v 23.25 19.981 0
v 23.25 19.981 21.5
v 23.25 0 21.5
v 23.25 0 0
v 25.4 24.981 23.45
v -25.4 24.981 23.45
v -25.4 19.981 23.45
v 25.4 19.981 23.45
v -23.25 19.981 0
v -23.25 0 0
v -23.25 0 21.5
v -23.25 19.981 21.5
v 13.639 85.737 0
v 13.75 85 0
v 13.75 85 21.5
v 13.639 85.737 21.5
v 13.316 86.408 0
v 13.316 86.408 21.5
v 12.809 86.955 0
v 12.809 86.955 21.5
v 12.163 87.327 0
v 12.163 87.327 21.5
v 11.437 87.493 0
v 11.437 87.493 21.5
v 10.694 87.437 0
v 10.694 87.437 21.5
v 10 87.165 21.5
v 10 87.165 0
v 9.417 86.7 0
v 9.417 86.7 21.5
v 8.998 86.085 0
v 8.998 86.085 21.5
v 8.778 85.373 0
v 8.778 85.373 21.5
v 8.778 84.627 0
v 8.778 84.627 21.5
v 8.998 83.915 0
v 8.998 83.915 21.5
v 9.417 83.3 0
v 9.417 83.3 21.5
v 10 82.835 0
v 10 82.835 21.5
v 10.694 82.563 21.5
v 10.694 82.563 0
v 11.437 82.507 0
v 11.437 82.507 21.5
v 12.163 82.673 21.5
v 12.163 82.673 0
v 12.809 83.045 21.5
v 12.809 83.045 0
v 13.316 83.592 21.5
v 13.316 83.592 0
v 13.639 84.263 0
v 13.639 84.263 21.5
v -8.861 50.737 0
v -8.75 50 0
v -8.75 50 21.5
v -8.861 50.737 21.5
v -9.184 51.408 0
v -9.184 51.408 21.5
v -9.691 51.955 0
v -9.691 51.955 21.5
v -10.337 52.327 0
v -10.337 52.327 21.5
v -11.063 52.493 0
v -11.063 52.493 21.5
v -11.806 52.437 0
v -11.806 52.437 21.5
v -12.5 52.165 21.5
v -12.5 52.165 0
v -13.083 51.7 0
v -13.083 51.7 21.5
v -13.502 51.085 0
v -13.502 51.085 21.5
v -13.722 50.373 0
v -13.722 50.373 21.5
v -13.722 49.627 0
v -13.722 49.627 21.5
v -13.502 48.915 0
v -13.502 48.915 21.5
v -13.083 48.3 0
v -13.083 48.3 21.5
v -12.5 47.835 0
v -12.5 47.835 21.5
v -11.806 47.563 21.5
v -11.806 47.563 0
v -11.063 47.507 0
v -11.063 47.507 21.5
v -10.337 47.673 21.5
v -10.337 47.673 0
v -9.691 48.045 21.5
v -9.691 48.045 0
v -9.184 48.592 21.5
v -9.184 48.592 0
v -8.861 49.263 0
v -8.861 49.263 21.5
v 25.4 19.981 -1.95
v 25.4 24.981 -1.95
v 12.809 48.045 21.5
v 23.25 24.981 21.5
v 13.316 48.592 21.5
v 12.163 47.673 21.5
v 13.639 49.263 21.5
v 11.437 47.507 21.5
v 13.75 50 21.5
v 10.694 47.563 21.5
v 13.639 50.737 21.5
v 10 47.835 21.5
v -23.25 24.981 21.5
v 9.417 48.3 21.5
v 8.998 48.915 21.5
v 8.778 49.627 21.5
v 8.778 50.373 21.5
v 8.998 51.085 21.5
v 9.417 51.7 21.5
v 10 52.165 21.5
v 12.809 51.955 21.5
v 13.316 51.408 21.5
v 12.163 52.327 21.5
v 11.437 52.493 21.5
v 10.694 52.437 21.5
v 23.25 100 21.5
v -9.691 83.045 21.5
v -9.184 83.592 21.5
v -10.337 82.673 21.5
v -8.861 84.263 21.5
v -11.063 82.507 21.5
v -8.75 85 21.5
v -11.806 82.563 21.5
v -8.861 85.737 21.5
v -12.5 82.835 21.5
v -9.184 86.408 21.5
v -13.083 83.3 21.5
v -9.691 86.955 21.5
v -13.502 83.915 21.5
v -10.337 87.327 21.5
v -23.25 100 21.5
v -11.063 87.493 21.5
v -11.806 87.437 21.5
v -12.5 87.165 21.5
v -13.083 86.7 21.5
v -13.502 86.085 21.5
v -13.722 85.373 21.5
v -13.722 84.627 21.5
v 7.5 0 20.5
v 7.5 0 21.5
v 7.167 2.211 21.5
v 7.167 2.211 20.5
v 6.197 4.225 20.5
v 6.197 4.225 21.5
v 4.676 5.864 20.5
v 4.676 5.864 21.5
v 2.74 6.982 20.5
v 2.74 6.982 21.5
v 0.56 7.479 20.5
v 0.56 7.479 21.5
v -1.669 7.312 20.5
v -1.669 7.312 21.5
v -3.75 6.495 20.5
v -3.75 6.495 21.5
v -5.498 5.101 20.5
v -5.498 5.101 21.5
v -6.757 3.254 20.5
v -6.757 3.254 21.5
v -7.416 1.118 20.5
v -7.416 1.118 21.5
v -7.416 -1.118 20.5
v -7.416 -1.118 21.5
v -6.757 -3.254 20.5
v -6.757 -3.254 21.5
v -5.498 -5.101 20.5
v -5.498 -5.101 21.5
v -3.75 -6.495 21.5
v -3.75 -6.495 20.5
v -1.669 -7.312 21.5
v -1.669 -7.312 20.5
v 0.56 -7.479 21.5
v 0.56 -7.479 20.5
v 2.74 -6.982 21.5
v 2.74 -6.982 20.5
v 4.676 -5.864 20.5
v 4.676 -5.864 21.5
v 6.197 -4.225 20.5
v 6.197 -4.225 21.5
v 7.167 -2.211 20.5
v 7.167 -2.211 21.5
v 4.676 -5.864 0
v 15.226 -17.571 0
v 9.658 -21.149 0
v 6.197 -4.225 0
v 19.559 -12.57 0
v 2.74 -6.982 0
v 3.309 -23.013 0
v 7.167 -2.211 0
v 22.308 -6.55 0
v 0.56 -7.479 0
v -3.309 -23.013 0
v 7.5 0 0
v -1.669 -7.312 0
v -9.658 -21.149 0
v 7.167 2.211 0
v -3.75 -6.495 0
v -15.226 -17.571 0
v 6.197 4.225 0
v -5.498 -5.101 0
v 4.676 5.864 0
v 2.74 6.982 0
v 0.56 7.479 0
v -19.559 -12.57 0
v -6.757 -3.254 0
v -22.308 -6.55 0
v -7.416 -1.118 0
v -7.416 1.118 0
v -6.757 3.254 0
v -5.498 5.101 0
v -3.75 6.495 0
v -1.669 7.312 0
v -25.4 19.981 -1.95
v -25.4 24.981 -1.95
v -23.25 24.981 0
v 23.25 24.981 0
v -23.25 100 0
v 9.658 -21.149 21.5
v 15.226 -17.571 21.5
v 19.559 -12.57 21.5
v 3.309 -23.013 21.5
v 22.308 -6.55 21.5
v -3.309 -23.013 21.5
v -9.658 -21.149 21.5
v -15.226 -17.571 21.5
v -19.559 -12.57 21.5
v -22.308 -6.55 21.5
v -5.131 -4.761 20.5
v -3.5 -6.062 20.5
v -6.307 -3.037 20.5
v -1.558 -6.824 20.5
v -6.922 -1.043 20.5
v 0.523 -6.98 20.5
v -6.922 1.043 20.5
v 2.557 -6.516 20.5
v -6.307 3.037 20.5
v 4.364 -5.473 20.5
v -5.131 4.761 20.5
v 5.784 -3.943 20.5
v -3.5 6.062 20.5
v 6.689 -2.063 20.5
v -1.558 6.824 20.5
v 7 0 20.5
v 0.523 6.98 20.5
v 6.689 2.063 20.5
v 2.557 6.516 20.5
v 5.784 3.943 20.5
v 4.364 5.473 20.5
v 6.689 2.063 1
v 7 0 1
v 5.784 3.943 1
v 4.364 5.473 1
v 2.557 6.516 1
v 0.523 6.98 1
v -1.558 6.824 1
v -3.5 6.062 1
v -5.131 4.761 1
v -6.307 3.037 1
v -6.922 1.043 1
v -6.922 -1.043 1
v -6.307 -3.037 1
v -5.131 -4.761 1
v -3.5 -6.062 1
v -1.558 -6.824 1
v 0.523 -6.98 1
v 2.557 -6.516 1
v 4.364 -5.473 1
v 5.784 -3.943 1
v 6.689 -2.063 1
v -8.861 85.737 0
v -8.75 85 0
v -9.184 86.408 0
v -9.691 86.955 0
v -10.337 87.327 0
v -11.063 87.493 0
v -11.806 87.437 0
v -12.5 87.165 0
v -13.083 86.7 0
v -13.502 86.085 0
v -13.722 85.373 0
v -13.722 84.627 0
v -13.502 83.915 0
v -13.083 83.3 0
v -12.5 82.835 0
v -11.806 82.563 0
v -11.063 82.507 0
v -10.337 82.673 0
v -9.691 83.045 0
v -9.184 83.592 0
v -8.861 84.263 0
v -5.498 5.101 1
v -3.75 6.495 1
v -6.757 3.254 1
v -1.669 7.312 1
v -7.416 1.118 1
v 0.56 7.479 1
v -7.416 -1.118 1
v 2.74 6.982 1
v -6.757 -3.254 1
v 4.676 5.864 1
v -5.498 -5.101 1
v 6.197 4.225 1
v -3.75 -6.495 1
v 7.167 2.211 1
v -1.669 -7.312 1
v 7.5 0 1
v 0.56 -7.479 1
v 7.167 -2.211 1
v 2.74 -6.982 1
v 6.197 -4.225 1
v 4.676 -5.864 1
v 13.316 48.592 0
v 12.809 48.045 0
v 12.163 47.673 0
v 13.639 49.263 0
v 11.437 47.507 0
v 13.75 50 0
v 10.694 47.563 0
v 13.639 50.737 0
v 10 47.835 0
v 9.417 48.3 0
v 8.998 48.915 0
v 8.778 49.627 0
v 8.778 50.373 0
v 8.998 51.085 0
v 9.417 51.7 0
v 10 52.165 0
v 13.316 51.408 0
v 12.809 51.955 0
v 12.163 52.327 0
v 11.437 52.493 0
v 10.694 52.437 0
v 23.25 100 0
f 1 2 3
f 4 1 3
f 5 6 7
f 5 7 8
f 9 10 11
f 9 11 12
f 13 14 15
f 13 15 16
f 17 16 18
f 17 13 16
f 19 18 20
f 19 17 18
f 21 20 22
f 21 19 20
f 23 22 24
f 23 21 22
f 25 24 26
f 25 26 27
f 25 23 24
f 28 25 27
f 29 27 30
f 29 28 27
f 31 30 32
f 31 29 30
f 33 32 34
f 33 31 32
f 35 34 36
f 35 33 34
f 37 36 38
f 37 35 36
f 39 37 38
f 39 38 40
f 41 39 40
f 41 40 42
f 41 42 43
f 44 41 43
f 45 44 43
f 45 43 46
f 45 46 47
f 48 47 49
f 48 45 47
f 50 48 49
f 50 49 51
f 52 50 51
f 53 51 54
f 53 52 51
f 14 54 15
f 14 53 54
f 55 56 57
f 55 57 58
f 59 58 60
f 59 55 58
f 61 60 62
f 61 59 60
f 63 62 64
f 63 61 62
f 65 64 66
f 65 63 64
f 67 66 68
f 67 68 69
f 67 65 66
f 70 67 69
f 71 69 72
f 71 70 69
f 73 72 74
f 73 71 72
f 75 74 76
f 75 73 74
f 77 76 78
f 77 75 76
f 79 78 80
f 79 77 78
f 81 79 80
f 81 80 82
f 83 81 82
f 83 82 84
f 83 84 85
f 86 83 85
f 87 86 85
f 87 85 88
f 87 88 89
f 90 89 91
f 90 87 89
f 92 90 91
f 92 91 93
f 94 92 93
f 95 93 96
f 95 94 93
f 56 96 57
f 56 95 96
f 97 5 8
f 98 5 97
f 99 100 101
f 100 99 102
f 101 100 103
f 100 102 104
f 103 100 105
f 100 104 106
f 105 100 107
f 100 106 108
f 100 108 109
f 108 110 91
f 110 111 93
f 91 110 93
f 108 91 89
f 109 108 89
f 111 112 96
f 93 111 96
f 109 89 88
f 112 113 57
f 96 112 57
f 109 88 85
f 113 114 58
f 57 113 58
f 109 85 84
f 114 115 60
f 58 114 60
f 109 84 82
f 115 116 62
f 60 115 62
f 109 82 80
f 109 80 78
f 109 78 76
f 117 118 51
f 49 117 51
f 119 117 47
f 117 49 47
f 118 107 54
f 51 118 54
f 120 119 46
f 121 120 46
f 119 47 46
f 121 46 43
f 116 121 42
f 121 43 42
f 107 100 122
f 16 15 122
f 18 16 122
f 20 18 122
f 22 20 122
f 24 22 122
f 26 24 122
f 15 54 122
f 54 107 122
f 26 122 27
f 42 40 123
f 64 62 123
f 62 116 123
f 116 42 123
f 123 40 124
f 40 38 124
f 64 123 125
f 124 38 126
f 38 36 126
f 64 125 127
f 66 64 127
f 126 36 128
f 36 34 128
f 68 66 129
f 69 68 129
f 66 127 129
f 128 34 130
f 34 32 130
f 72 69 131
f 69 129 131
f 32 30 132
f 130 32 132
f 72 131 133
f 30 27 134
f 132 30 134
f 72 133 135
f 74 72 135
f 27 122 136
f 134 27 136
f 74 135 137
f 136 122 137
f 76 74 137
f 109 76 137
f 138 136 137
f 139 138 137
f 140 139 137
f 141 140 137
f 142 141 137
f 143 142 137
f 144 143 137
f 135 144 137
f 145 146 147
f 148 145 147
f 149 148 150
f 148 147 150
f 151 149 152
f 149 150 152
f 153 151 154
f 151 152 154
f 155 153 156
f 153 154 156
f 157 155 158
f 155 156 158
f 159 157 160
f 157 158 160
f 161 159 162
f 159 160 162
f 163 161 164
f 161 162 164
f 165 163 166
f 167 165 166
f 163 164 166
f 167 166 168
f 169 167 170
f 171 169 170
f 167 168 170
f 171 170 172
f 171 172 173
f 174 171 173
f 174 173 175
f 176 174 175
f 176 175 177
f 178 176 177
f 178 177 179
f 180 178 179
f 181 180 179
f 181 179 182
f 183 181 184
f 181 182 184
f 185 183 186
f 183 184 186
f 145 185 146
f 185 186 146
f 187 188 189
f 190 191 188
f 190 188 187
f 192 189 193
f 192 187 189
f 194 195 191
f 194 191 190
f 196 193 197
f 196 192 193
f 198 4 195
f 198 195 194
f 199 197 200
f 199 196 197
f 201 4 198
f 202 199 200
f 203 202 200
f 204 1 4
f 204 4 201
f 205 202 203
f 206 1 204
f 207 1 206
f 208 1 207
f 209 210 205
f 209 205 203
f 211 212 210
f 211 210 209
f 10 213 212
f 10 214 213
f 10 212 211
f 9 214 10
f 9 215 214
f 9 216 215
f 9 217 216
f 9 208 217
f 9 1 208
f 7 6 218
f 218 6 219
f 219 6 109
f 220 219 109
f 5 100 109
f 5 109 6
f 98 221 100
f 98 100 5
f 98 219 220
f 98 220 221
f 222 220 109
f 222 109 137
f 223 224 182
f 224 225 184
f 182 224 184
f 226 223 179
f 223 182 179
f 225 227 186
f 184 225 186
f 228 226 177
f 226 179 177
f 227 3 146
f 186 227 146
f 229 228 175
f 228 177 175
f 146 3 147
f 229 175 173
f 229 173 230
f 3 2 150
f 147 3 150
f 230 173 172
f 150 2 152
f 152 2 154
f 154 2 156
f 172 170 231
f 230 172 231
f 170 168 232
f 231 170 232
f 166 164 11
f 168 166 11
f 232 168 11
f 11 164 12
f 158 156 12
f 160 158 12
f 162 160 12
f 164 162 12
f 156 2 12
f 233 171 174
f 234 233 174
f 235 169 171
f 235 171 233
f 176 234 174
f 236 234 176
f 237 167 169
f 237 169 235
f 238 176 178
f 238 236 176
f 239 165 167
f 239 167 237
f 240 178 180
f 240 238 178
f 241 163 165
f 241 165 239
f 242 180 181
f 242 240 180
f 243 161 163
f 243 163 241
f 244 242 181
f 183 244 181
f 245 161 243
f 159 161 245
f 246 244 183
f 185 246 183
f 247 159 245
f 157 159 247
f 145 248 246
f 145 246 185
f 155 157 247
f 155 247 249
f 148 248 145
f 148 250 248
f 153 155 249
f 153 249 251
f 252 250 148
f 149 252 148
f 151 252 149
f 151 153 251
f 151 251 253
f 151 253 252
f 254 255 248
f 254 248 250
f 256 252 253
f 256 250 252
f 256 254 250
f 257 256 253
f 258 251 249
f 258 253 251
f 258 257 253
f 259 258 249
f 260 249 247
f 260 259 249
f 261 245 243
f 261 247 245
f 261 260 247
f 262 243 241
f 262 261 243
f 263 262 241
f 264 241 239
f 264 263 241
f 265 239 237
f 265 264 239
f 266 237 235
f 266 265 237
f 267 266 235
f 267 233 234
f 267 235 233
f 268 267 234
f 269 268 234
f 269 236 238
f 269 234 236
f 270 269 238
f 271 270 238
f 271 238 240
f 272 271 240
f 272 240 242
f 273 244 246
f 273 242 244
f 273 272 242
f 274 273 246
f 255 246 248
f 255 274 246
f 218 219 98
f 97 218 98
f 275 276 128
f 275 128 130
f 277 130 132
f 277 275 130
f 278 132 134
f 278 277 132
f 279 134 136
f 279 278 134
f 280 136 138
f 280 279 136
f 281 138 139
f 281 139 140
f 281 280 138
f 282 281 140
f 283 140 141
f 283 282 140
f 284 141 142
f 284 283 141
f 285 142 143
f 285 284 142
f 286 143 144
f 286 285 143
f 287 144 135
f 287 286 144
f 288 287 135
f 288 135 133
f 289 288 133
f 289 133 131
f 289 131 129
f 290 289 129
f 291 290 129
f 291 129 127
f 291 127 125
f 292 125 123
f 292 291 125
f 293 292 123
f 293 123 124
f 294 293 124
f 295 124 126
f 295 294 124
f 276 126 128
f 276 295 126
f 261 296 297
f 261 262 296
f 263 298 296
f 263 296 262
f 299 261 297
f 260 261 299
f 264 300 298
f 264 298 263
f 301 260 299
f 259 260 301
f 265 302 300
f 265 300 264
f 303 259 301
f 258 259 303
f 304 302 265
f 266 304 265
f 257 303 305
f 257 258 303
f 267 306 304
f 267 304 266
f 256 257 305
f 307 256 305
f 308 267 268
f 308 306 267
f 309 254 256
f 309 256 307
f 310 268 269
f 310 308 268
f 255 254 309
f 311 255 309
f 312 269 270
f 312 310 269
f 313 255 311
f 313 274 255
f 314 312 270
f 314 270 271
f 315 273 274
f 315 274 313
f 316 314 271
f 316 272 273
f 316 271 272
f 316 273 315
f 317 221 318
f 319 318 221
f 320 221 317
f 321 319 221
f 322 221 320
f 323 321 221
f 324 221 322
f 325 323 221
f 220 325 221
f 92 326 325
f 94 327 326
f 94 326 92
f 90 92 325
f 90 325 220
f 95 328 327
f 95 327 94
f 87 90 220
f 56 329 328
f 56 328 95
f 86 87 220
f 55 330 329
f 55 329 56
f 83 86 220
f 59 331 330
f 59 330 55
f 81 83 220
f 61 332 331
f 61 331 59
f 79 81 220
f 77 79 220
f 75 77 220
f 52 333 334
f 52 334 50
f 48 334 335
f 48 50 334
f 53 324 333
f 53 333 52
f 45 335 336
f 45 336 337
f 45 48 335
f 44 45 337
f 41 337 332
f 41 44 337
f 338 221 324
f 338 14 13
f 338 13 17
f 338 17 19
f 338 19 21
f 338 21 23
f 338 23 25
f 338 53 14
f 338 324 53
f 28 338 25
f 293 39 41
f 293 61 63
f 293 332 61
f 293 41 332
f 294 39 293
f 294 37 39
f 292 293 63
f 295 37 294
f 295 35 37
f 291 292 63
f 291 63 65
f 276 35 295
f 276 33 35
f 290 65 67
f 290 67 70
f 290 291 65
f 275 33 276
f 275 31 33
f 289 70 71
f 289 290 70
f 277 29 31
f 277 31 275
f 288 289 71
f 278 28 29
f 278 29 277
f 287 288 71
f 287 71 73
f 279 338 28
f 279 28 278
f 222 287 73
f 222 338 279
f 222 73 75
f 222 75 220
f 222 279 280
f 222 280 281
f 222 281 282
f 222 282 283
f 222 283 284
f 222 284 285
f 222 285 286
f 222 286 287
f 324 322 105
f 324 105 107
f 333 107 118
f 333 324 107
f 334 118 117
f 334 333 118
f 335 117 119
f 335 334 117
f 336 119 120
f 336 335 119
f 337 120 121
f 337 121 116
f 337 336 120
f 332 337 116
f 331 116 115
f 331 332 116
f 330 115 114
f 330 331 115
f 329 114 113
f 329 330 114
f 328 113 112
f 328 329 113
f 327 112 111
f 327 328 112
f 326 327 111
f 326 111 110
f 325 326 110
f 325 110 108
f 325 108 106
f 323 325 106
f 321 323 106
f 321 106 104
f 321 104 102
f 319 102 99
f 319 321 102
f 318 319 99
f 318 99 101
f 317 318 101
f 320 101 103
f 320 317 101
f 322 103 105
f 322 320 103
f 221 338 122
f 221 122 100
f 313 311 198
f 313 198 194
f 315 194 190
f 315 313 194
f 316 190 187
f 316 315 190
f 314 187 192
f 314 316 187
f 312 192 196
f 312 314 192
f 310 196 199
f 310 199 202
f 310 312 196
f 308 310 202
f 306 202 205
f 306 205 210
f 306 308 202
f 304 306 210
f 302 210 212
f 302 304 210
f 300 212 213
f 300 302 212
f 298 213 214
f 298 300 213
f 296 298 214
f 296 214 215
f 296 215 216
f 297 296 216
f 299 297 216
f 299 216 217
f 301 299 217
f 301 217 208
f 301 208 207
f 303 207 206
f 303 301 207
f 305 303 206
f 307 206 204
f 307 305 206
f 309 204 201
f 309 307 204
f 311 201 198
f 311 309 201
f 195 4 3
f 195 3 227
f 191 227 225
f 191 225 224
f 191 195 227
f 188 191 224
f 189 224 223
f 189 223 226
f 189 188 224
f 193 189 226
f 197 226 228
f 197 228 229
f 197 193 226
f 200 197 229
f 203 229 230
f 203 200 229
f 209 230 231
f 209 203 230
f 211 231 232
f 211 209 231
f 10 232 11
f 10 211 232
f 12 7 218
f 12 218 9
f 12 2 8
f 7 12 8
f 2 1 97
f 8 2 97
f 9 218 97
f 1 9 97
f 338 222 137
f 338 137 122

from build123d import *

# Parameters (mm, degrees)
SKETCH1_R           = 7
SKETCH1_R_2         = 2.5
BOSS_EXTRUDE1_DEPTH = 21.5
SKETCH2_R           = 7.5
CUT_EXTRUDE1_DEPTH  = 1
CUT_EXTRUDE2_START  = -1
SKETCH3_R           = 7.5
CUT_EXTRUDE2_DEPTH  = 1
SKETCH5_W           = 50.8
SKETCH5_H           = 25.4
SKETCH5_W_2         = 46.5
SKETCH5_H_2         = 21.5
BOSS_EXTRUDE2_DEPTH = 5


with BuildPart() as part:
    # Sketch1 → Boss-Extrude1 (new body)
    with BuildSketch(Plane.XY):
        with BuildLine():
            Line((-23.25, 0), (-23.25, 100))
            Line((-23.25, 100), (23.25, 100))
            Line((23.25, 100), (23.25, 0))
            ThreePointArc((23.25, 0), (0, -23.25), (-23.25, 0))
        make_face()
        Circle(SKETCH1_R, mode=Mode.SUBTRACT)
        with Locations((-11.25, 85)):
            Circle(SKETCH1_R_2, mode=Mode.SUBTRACT)
        with Locations((11.25, 85)):
            Circle(SKETCH1_R_2, mode=Mode.SUBTRACT)
        with Locations((11.25, 50)):
            Circle(SKETCH1_R_2, mode=Mode.SUBTRACT)
        with Locations((-11.25, 50)):
            Circle(SKETCH1_R_2, mode=Mode.SUBTRACT)
    extrude(amount=BOSS_EXTRUDE1_DEPTH)

    # Sketch2 → Cut-Extrude1 (cut)
    with BuildSketch(Plane.XY.offset(21.5)):
        Circle(SKETCH2_R)
    extrude(amount=-CUT_EXTRUDE1_DEPTH, mode=Mode.SUBTRACT)

    # Sketch3 → Cut-Extrude2 (cut)
    with BuildSketch(Plane(origin=(0, 0, 0), x_dir=(-1, 0, 0), z_dir=(0, 0, -1)).offset(CUT_EXTRUDE2_START)):
        with Locations(Location((0, 0, 0), (0, 0, 180))):
            Circle(SKETCH3_R)
    extrude(amount=CUT_EXTRUDE2_DEPTH, mode=Mode.SUBTRACT)

    # Sketch5 → Boss-Extrude2 (add)
    with BuildSketch(Plane(origin=(0, 24.981, 0), x_dir=(1, 0, 0), z_dir=(0, 1, 0))):
        with Locations((0, -10.75)):
            Rectangle(SKETCH5_W, SKETCH5_H)
        with Locations((0, -10.75)):
            Rectangle(SKETCH5_W_2, SKETCH5_H_2, mode=Mode.SUBTRACT)
    extrude(amount=-BOSS_EXTRUDE2_DEPTH)


solid = part.part
